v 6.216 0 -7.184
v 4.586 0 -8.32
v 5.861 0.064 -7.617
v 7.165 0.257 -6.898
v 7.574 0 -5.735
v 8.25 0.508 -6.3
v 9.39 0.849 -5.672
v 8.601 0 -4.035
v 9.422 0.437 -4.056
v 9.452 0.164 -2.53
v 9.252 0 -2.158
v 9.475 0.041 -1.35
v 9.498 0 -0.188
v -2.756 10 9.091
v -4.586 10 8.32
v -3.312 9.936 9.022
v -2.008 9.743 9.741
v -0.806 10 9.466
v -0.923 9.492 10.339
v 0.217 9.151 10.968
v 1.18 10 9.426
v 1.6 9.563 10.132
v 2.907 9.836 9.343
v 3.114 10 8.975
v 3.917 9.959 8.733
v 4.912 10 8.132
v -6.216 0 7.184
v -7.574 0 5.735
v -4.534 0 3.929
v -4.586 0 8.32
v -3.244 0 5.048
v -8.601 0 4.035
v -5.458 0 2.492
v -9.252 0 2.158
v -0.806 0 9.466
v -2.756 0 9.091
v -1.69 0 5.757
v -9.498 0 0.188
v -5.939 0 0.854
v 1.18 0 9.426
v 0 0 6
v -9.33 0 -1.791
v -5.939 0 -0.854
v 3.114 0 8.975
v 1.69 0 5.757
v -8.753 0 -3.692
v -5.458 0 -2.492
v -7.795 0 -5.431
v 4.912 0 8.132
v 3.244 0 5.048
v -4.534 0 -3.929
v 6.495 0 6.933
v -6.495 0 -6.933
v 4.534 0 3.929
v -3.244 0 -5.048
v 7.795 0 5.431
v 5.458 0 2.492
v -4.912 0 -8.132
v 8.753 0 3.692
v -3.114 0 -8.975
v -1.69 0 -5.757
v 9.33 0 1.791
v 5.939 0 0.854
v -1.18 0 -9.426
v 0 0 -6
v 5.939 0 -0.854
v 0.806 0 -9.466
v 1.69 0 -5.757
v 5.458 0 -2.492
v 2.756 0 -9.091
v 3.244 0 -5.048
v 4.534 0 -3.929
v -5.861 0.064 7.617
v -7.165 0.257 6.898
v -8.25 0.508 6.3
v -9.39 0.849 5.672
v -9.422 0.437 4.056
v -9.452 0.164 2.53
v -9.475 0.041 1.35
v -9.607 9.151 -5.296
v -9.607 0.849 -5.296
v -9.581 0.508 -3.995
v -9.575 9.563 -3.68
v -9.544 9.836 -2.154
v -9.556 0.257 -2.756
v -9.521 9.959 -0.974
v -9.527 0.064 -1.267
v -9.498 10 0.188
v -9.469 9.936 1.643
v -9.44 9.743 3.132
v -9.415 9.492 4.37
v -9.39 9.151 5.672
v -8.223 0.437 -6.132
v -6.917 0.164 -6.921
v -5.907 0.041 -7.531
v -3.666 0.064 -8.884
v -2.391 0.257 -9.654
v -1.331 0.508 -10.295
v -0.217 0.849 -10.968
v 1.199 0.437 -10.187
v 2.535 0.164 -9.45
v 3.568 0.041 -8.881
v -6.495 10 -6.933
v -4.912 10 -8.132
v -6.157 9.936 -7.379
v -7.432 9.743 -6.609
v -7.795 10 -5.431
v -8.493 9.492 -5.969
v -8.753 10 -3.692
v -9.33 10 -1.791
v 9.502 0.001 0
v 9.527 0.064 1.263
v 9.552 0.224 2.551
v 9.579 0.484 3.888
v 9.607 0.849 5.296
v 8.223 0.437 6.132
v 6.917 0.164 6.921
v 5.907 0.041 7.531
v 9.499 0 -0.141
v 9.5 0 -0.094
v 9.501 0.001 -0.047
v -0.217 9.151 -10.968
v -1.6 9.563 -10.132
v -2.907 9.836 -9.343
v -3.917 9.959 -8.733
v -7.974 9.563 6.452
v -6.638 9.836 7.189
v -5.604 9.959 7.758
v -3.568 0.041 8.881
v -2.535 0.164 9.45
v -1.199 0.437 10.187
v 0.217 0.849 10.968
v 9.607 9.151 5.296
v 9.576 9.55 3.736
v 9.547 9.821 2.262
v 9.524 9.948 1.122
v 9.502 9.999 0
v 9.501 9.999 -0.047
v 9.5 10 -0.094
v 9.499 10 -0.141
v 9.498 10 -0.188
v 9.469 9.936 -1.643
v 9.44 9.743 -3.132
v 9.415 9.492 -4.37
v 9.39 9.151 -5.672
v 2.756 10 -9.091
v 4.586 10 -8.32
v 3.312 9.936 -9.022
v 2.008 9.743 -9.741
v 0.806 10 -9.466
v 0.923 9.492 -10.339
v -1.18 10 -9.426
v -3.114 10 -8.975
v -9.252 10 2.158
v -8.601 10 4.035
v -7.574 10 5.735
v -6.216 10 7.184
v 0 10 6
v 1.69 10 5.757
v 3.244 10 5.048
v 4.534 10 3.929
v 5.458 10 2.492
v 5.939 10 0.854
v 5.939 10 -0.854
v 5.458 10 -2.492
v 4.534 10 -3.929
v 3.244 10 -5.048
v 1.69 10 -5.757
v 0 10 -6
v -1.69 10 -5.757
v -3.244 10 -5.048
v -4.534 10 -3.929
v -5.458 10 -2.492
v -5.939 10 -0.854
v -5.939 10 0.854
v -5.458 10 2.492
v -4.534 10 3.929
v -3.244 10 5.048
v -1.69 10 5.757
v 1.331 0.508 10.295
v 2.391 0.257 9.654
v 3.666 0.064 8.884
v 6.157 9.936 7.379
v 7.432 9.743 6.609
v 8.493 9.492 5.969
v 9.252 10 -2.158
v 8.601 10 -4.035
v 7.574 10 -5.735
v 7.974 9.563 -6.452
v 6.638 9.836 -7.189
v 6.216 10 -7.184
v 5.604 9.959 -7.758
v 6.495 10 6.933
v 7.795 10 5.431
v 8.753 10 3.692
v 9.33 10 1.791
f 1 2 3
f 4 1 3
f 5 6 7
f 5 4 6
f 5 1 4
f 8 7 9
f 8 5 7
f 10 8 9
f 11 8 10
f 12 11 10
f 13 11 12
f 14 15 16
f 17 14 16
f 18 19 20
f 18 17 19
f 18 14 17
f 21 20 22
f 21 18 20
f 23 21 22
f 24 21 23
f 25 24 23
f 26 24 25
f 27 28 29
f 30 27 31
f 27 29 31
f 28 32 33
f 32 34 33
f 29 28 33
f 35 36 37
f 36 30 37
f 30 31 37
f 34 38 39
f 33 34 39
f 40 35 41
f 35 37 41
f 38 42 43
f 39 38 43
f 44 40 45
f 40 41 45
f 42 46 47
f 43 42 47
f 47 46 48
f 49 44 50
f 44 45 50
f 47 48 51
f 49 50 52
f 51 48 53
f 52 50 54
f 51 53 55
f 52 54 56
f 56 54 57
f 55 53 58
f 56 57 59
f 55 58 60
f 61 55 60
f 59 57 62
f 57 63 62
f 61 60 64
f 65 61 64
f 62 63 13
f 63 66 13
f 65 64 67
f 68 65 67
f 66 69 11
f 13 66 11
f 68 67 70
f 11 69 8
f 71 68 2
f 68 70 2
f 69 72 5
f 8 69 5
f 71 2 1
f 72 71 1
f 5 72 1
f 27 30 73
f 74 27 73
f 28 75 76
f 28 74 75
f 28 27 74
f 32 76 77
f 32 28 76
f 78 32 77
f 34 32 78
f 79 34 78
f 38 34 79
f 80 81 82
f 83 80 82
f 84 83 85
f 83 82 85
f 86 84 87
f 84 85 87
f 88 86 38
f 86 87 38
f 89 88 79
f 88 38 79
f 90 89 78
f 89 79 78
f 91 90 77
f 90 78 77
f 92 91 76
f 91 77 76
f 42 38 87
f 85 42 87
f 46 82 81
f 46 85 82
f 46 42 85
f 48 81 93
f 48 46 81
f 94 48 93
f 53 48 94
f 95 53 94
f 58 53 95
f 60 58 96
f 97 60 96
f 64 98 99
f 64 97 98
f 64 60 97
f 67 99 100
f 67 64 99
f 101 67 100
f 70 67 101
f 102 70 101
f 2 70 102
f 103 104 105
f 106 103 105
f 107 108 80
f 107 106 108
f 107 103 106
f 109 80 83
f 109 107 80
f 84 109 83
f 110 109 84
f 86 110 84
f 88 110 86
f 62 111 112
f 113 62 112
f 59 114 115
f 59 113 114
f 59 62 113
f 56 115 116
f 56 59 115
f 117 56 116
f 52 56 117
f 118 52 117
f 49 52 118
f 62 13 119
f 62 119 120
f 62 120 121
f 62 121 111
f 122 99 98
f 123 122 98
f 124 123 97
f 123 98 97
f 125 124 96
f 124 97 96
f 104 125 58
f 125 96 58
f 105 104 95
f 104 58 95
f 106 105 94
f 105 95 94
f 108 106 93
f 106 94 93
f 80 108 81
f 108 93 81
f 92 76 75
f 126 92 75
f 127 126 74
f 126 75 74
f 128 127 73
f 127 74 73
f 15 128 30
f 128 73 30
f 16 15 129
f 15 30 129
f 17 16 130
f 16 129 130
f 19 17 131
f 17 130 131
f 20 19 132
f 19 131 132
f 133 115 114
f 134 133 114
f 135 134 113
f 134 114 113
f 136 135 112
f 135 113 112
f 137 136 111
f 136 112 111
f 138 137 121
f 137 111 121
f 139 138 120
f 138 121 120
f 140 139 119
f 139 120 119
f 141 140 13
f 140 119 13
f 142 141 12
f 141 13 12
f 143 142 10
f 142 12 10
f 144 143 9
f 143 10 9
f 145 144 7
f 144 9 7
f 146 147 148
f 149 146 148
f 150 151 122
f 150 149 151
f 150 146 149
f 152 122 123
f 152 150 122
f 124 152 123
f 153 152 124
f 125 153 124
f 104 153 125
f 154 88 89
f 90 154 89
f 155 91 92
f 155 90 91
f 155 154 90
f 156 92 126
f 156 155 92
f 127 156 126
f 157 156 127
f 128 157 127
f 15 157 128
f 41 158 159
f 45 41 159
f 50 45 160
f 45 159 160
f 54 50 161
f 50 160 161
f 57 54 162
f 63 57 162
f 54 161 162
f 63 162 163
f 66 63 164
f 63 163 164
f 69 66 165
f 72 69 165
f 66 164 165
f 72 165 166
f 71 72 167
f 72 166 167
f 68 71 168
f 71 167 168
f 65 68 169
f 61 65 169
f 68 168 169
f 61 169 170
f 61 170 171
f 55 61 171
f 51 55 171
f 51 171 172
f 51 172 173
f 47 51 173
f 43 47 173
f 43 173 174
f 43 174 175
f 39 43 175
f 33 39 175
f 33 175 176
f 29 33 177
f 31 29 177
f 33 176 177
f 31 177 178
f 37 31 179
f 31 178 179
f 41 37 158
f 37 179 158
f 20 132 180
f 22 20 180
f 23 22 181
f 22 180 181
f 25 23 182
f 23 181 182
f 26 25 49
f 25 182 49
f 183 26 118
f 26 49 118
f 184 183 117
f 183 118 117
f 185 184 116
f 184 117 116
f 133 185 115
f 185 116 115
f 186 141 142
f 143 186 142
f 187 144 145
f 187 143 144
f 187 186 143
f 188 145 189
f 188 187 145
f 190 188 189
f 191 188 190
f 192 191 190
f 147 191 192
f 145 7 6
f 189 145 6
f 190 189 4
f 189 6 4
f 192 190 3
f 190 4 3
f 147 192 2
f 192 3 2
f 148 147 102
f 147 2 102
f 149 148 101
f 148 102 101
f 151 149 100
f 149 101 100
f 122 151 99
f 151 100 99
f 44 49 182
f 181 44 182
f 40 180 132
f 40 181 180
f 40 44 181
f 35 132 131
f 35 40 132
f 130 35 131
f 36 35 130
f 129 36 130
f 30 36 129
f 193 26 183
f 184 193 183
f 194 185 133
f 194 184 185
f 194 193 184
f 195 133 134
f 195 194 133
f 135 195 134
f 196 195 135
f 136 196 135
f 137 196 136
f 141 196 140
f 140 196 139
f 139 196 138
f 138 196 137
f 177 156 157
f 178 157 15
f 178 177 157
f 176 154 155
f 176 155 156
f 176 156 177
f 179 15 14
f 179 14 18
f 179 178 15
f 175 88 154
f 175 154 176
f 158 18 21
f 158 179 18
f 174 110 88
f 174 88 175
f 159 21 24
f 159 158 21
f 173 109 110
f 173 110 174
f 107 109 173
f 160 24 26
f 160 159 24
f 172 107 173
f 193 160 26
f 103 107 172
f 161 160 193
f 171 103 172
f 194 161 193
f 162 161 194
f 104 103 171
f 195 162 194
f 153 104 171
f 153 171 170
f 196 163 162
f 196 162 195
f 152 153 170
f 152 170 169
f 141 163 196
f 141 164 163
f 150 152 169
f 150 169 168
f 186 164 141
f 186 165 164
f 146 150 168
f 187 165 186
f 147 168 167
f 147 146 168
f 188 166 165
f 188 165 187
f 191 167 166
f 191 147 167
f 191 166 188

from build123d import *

# Parameters (mm, degrees)
BOSS_EXTRUDE1_DEPTH = 10
SKETCH2_R           = 6
CUT_EXTRUDE1_DEPTH  = 10
SKETCH3_OUTSIDE_W   = 68.948
SKETCH3_OUTSIDE_H   = 71.67
SKETCH3_OUTSIDE_R   = 9.5
CUT_EXTRUDE4_DEPTH  = 12
CUT_EXTRUDE4_DRAFT  = -60
SKETCH4_OUTSIDE_W   = 68.948
SKETCH4_OUTSIDE_H   = 71.67
SKETCH4_OUTSIDE_R   = 9.5
CUT_EXTRUDE5_DEPTH  = 12
CUT_EXTRUDE5_DRAFT  = -60


with BuildPart() as part:
    # Sketch1 → Boss-Extrude1 (new body)
    with BuildSketch(Plane(origin=(0, 0, 0), x_dir=(1, 0, 0), z_dir=(0, 1, 0))):
        Polygon((9.606581004, -5.295935682), (9.389705339, 5.671575352), (-0.216875665, 10.967511034), (-9.606581004, 5.295935682), (-9.389705339, -5.671575352), (0.216875665, -10.967511034), align=None)
    extrude(amount=BOSS_EXTRUDE1_DEPTH)

    # Sketch2 → Cut-Extrude1 (cut)
    with BuildSketch(Plane(origin=(0, 10, 0), x_dir=(1, 0, 0), z_dir=(0, 1, 0))):
        with Locations(Location((0, 0, 0), (0, 0, 270))):
            Circle(SKETCH2_R)
    extrude(amount=-CUT_EXTRUDE1_DEPTH, mode=Mode.SUBTRACT)


with BuildPart() as cut_extrude4_tool:
    # Sketch3 outside → Cut-Extrude4 (with draft: the straight prism first)
    with BuildSketch(Plane(origin=(0, 10, 0), x_dir=(1, 0, 0), z_dir=(0, 1, 0))):
        Rectangle(SKETCH3_OUTSIDE_W, SKETCH3_OUTSIDE_H)
        Circle(SKETCH3_OUTSIDE_R, mode=Mode.SUBTRACT)
    extrude(amount=-CUT_EXTRUDE4_DEPTH)
    # Cut-Extrude4: the draft: its side faces are tilted about the plane it starts from
    cut_extrude4_sides = [cut_extrude4_tool.faces().sort_by_distance(p)[0] for p in [
        (0, 4, 35.835),
        (34.474, 4, 0),
        (0, 4, -35.835),
        (-34.474, 4, 0),
        (-9.5, 4, 0),
    ]]
    draft(cut_extrude4_sides, Plane(origin=(0, 10, 0), x_dir=(1, 0, 0), z_dir=(0, 1, 0)), CUT_EXTRUDE4_DRAFT)


with BuildPart() as part_1:
    add(part.part)

    # Cut-Extrude4: cut by cut_extrude4_tool
    add(cut_extrude4_tool.part, mode=Mode.SUBTRACT)


with BuildPart() as cut_extrude5_tool:
    # Sketch4 outside → Cut-Extrude5 (with draft: the straight prism first)
    with BuildSketch(Plane.XZ):
        Rectangle(SKETCH4_OUTSIDE_W, SKETCH4_OUTSIDE_H)
        Circle(SKETCH4_OUTSIDE_R, mode=Mode.SUBTRACT)
    extrude(amount=-CUT_EXTRUDE5_DEPTH)
    # Cut-Extrude5: the draft: its side faces are tilted about the plane it starts from
    cut_extrude5_sides = [cut_extrude5_tool.faces().sort_by_distance(p)[0] for p in [
        (0, 6, -35.835),
        (34.474, 6, 0),
        (0, 6, 35.835),
        (-34.474, 6, 0),
        (-9.5, 6, 0),
    ]]
    draft(cut_extrude5_sides, Plane.XZ, CUT_EXTRUDE5_DRAFT)


with BuildPart() as part_2:
    add(part_1.part)

    # Cut-Extrude5: cut by cut_extrude5_tool
    add(cut_extrude5_tool.part, mode=Mode.SUBTRACT)


solid = part_2.part
